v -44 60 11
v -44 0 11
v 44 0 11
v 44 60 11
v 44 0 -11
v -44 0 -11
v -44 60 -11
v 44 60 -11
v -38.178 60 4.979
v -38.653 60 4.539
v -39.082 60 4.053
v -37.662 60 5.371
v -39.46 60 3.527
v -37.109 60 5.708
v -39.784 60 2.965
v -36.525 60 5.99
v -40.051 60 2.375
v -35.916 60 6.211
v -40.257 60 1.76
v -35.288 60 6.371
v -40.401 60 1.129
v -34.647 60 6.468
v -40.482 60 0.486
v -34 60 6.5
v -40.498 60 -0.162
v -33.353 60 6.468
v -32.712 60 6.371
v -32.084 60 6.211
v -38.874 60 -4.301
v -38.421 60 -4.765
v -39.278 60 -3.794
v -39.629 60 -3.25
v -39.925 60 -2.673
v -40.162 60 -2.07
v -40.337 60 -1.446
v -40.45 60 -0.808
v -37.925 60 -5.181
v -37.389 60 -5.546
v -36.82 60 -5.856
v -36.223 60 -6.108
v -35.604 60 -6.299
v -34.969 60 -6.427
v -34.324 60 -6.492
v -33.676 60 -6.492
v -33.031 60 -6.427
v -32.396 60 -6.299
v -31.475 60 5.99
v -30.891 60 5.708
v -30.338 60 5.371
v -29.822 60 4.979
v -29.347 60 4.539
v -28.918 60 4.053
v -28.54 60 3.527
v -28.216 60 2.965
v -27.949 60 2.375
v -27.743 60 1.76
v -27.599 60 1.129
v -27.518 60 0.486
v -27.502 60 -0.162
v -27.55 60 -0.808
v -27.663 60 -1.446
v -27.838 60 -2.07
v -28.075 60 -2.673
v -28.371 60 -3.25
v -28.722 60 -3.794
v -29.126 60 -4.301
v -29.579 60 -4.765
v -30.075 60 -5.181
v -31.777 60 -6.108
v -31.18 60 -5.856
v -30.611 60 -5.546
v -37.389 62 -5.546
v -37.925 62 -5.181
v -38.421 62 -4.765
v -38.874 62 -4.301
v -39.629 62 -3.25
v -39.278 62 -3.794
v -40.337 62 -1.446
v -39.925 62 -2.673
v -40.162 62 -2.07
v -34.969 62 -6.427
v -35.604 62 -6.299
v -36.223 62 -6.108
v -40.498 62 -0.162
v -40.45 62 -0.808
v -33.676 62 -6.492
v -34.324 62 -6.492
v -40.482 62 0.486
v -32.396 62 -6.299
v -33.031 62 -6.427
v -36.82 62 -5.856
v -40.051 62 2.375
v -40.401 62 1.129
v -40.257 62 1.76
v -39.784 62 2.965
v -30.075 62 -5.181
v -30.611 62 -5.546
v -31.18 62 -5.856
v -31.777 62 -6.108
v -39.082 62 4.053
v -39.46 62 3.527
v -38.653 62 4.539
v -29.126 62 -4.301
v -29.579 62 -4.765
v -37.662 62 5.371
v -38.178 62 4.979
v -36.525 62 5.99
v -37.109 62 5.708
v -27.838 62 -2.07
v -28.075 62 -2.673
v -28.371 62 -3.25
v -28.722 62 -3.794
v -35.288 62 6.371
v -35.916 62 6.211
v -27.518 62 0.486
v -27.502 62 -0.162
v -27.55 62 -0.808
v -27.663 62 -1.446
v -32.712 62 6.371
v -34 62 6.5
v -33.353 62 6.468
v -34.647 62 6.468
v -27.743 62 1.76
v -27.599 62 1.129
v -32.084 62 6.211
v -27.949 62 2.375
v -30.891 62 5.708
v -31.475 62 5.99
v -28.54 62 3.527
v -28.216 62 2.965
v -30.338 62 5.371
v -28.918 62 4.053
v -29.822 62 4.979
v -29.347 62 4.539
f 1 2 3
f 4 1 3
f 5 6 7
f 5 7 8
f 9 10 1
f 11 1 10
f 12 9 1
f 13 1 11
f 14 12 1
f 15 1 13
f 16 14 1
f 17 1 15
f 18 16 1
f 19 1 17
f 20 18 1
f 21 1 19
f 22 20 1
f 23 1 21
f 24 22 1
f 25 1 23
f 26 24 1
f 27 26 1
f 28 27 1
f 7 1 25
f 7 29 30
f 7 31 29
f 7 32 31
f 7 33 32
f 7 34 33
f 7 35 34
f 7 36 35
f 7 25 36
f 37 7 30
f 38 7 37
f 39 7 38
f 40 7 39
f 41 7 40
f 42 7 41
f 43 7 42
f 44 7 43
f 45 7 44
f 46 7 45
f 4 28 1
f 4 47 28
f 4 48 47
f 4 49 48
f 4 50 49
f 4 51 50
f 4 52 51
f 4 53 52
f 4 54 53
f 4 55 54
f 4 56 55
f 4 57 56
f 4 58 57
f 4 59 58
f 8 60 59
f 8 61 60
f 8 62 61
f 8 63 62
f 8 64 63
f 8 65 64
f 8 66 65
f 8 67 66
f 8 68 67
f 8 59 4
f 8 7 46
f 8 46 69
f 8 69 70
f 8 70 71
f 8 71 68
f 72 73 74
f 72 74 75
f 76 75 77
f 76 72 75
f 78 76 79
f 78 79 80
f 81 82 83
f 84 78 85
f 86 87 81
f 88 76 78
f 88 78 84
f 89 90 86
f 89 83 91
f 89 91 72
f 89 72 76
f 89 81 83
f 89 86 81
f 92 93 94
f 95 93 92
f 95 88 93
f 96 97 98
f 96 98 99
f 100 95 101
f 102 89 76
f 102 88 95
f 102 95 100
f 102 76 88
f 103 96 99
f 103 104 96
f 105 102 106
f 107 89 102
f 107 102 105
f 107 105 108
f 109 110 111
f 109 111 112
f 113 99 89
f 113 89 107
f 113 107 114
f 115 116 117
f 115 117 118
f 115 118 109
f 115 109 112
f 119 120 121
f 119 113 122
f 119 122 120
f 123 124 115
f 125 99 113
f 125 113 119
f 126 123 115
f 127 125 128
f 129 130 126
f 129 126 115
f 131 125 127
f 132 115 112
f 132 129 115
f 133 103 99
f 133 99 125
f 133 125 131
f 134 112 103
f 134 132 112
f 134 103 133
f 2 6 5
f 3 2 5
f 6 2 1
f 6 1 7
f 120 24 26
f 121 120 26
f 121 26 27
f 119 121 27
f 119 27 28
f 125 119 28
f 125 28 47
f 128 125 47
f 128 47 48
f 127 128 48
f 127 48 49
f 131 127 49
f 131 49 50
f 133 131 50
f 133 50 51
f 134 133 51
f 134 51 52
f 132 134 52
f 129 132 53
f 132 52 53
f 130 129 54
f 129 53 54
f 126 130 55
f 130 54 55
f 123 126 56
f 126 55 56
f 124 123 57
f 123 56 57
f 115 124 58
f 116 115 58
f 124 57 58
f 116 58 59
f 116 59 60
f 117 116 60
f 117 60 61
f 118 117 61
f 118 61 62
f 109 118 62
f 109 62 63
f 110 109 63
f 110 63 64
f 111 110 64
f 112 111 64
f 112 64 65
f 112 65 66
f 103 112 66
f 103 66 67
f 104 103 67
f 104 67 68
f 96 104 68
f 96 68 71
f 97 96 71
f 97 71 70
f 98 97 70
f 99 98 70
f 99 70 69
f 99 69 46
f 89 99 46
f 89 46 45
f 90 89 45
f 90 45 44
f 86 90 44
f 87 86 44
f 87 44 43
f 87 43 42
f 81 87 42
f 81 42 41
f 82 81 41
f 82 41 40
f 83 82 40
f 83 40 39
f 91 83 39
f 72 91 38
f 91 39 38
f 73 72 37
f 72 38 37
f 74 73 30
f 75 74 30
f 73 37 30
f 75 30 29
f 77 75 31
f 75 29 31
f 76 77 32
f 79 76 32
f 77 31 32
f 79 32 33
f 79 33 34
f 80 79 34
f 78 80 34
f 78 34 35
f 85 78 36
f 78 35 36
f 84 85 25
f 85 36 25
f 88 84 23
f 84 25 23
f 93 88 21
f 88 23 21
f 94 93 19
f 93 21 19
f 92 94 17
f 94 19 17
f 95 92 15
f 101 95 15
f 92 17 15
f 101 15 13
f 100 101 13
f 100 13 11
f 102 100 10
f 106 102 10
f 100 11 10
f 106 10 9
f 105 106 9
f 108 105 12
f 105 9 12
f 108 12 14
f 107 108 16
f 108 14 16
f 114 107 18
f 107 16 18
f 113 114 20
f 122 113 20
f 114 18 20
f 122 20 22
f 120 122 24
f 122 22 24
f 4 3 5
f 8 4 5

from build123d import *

# Parameters (mm, degrees)
SKETCH1_W           = 88
SKETCH1_H           = 22
SKETCH1_R           = 6.5
BOSS_EXTRUDE1_DEPTH = 60
SKETCH1_3_R         = 6.5
BOSS_EXTRUDE2_DEPTH = 62


with BuildPart() as part:
    # Sketch1 → Boss-Extrude1 (new body)
    with BuildSketch(Plane(origin=(0, 0, 0), x_dir=(1, 0, 0), z_dir=(0, 1, 0))):
        Rectangle(SKETCH1_W, SKETCH1_H)
        with Locations((-34, 0)):
            Circle(SKETCH1_R, mode=Mode.SUBTRACT)
    extrude(amount=BOSS_EXTRUDE1_DEPTH)

    # Sketch1<3> → Boss-Extrude2 (add)
    with BuildSketch(Plane(origin=(0, 0, 0), x_dir=(1, 0, 0), z_dir=(0, 1, 0))):
        with Locations((-34, 0)):
            Circle(SKETCH1_3_R)
    extrude(amount=BOSS_EXTRUDE2_DEPTH)


solid = part.part
